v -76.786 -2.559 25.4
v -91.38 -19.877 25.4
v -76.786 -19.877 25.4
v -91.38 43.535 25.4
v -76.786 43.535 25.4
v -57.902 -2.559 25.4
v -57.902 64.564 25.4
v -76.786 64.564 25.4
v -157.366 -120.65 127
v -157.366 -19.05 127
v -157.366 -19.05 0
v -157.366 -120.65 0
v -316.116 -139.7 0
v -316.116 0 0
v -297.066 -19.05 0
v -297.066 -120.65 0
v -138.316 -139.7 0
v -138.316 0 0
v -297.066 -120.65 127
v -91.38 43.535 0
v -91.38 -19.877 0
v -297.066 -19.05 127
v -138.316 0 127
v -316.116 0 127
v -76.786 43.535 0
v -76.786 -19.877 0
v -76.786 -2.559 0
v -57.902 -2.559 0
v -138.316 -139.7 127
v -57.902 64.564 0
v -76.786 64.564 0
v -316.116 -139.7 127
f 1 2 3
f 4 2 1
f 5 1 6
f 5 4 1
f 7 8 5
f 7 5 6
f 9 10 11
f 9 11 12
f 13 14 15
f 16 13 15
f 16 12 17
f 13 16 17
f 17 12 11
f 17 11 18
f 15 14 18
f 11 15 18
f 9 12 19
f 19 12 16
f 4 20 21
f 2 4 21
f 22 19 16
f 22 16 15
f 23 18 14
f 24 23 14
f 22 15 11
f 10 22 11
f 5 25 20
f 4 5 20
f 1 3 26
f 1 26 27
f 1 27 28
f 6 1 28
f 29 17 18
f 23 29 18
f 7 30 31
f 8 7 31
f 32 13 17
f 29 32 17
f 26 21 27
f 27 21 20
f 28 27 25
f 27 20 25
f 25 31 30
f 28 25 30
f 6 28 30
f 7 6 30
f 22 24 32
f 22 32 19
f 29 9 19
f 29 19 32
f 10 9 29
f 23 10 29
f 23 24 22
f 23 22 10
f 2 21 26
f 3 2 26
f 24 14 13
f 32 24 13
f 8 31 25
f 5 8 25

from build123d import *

# Parameters (mm, degrees)
F0_W     = 139.7
F0_H     = 19.05
F1_DEPTH = 127
F3_DEPTH = 25.4


with BuildPart() as f1:
    # F0 (on Top) → F1 (new body)
    with BuildSketch(Plane.XY):
        Polygon((-297.066145, 0), (-316.116145, 0), (-316.116145, -139.7), (-297.066145, -139.7), (-297.066145, -120.65), (-297.066145, -19.05), align=None)
        with Locations((-227.216145, -9.525)):
            Rectangle(F0_W, F0_H)
        Polygon((-138.316145, 0), (-157.366145, 0), (-157.366145, -19.05), (-157.366145, -120.65), (-157.366145, -139.7), (-138.316145, -139.7), align=None)
        Polygon((-297.066145, -120.65), (-297.066145, -139.7), (-296.983391, -139.7), (-157.366145, -139.7), (-157.366145, -120.65), align=None)
    extrude(amount=F1_DEPTH)


with BuildPart() as f3:
    # F2 (on Top) → F3 (new body)
    with BuildSketch(Plane.XY):
        Polygon((-76.786309, 43.534547), (-91.379844, 43.534547), (-91.379844, -19.877201), (-76.786309, -19.877201), (-76.786309, -2.558584), align=None)
        Polygon((-76.786309, 64.563766), (-76.786309, 43.534547), (-76.786309, -2.558584), (-57.902455, -2.558584), (-57.902455, 64.563766), align=None)
    extrude(amount=F3_DEPTH)


solid = Compound([f1.part, f3.part])
